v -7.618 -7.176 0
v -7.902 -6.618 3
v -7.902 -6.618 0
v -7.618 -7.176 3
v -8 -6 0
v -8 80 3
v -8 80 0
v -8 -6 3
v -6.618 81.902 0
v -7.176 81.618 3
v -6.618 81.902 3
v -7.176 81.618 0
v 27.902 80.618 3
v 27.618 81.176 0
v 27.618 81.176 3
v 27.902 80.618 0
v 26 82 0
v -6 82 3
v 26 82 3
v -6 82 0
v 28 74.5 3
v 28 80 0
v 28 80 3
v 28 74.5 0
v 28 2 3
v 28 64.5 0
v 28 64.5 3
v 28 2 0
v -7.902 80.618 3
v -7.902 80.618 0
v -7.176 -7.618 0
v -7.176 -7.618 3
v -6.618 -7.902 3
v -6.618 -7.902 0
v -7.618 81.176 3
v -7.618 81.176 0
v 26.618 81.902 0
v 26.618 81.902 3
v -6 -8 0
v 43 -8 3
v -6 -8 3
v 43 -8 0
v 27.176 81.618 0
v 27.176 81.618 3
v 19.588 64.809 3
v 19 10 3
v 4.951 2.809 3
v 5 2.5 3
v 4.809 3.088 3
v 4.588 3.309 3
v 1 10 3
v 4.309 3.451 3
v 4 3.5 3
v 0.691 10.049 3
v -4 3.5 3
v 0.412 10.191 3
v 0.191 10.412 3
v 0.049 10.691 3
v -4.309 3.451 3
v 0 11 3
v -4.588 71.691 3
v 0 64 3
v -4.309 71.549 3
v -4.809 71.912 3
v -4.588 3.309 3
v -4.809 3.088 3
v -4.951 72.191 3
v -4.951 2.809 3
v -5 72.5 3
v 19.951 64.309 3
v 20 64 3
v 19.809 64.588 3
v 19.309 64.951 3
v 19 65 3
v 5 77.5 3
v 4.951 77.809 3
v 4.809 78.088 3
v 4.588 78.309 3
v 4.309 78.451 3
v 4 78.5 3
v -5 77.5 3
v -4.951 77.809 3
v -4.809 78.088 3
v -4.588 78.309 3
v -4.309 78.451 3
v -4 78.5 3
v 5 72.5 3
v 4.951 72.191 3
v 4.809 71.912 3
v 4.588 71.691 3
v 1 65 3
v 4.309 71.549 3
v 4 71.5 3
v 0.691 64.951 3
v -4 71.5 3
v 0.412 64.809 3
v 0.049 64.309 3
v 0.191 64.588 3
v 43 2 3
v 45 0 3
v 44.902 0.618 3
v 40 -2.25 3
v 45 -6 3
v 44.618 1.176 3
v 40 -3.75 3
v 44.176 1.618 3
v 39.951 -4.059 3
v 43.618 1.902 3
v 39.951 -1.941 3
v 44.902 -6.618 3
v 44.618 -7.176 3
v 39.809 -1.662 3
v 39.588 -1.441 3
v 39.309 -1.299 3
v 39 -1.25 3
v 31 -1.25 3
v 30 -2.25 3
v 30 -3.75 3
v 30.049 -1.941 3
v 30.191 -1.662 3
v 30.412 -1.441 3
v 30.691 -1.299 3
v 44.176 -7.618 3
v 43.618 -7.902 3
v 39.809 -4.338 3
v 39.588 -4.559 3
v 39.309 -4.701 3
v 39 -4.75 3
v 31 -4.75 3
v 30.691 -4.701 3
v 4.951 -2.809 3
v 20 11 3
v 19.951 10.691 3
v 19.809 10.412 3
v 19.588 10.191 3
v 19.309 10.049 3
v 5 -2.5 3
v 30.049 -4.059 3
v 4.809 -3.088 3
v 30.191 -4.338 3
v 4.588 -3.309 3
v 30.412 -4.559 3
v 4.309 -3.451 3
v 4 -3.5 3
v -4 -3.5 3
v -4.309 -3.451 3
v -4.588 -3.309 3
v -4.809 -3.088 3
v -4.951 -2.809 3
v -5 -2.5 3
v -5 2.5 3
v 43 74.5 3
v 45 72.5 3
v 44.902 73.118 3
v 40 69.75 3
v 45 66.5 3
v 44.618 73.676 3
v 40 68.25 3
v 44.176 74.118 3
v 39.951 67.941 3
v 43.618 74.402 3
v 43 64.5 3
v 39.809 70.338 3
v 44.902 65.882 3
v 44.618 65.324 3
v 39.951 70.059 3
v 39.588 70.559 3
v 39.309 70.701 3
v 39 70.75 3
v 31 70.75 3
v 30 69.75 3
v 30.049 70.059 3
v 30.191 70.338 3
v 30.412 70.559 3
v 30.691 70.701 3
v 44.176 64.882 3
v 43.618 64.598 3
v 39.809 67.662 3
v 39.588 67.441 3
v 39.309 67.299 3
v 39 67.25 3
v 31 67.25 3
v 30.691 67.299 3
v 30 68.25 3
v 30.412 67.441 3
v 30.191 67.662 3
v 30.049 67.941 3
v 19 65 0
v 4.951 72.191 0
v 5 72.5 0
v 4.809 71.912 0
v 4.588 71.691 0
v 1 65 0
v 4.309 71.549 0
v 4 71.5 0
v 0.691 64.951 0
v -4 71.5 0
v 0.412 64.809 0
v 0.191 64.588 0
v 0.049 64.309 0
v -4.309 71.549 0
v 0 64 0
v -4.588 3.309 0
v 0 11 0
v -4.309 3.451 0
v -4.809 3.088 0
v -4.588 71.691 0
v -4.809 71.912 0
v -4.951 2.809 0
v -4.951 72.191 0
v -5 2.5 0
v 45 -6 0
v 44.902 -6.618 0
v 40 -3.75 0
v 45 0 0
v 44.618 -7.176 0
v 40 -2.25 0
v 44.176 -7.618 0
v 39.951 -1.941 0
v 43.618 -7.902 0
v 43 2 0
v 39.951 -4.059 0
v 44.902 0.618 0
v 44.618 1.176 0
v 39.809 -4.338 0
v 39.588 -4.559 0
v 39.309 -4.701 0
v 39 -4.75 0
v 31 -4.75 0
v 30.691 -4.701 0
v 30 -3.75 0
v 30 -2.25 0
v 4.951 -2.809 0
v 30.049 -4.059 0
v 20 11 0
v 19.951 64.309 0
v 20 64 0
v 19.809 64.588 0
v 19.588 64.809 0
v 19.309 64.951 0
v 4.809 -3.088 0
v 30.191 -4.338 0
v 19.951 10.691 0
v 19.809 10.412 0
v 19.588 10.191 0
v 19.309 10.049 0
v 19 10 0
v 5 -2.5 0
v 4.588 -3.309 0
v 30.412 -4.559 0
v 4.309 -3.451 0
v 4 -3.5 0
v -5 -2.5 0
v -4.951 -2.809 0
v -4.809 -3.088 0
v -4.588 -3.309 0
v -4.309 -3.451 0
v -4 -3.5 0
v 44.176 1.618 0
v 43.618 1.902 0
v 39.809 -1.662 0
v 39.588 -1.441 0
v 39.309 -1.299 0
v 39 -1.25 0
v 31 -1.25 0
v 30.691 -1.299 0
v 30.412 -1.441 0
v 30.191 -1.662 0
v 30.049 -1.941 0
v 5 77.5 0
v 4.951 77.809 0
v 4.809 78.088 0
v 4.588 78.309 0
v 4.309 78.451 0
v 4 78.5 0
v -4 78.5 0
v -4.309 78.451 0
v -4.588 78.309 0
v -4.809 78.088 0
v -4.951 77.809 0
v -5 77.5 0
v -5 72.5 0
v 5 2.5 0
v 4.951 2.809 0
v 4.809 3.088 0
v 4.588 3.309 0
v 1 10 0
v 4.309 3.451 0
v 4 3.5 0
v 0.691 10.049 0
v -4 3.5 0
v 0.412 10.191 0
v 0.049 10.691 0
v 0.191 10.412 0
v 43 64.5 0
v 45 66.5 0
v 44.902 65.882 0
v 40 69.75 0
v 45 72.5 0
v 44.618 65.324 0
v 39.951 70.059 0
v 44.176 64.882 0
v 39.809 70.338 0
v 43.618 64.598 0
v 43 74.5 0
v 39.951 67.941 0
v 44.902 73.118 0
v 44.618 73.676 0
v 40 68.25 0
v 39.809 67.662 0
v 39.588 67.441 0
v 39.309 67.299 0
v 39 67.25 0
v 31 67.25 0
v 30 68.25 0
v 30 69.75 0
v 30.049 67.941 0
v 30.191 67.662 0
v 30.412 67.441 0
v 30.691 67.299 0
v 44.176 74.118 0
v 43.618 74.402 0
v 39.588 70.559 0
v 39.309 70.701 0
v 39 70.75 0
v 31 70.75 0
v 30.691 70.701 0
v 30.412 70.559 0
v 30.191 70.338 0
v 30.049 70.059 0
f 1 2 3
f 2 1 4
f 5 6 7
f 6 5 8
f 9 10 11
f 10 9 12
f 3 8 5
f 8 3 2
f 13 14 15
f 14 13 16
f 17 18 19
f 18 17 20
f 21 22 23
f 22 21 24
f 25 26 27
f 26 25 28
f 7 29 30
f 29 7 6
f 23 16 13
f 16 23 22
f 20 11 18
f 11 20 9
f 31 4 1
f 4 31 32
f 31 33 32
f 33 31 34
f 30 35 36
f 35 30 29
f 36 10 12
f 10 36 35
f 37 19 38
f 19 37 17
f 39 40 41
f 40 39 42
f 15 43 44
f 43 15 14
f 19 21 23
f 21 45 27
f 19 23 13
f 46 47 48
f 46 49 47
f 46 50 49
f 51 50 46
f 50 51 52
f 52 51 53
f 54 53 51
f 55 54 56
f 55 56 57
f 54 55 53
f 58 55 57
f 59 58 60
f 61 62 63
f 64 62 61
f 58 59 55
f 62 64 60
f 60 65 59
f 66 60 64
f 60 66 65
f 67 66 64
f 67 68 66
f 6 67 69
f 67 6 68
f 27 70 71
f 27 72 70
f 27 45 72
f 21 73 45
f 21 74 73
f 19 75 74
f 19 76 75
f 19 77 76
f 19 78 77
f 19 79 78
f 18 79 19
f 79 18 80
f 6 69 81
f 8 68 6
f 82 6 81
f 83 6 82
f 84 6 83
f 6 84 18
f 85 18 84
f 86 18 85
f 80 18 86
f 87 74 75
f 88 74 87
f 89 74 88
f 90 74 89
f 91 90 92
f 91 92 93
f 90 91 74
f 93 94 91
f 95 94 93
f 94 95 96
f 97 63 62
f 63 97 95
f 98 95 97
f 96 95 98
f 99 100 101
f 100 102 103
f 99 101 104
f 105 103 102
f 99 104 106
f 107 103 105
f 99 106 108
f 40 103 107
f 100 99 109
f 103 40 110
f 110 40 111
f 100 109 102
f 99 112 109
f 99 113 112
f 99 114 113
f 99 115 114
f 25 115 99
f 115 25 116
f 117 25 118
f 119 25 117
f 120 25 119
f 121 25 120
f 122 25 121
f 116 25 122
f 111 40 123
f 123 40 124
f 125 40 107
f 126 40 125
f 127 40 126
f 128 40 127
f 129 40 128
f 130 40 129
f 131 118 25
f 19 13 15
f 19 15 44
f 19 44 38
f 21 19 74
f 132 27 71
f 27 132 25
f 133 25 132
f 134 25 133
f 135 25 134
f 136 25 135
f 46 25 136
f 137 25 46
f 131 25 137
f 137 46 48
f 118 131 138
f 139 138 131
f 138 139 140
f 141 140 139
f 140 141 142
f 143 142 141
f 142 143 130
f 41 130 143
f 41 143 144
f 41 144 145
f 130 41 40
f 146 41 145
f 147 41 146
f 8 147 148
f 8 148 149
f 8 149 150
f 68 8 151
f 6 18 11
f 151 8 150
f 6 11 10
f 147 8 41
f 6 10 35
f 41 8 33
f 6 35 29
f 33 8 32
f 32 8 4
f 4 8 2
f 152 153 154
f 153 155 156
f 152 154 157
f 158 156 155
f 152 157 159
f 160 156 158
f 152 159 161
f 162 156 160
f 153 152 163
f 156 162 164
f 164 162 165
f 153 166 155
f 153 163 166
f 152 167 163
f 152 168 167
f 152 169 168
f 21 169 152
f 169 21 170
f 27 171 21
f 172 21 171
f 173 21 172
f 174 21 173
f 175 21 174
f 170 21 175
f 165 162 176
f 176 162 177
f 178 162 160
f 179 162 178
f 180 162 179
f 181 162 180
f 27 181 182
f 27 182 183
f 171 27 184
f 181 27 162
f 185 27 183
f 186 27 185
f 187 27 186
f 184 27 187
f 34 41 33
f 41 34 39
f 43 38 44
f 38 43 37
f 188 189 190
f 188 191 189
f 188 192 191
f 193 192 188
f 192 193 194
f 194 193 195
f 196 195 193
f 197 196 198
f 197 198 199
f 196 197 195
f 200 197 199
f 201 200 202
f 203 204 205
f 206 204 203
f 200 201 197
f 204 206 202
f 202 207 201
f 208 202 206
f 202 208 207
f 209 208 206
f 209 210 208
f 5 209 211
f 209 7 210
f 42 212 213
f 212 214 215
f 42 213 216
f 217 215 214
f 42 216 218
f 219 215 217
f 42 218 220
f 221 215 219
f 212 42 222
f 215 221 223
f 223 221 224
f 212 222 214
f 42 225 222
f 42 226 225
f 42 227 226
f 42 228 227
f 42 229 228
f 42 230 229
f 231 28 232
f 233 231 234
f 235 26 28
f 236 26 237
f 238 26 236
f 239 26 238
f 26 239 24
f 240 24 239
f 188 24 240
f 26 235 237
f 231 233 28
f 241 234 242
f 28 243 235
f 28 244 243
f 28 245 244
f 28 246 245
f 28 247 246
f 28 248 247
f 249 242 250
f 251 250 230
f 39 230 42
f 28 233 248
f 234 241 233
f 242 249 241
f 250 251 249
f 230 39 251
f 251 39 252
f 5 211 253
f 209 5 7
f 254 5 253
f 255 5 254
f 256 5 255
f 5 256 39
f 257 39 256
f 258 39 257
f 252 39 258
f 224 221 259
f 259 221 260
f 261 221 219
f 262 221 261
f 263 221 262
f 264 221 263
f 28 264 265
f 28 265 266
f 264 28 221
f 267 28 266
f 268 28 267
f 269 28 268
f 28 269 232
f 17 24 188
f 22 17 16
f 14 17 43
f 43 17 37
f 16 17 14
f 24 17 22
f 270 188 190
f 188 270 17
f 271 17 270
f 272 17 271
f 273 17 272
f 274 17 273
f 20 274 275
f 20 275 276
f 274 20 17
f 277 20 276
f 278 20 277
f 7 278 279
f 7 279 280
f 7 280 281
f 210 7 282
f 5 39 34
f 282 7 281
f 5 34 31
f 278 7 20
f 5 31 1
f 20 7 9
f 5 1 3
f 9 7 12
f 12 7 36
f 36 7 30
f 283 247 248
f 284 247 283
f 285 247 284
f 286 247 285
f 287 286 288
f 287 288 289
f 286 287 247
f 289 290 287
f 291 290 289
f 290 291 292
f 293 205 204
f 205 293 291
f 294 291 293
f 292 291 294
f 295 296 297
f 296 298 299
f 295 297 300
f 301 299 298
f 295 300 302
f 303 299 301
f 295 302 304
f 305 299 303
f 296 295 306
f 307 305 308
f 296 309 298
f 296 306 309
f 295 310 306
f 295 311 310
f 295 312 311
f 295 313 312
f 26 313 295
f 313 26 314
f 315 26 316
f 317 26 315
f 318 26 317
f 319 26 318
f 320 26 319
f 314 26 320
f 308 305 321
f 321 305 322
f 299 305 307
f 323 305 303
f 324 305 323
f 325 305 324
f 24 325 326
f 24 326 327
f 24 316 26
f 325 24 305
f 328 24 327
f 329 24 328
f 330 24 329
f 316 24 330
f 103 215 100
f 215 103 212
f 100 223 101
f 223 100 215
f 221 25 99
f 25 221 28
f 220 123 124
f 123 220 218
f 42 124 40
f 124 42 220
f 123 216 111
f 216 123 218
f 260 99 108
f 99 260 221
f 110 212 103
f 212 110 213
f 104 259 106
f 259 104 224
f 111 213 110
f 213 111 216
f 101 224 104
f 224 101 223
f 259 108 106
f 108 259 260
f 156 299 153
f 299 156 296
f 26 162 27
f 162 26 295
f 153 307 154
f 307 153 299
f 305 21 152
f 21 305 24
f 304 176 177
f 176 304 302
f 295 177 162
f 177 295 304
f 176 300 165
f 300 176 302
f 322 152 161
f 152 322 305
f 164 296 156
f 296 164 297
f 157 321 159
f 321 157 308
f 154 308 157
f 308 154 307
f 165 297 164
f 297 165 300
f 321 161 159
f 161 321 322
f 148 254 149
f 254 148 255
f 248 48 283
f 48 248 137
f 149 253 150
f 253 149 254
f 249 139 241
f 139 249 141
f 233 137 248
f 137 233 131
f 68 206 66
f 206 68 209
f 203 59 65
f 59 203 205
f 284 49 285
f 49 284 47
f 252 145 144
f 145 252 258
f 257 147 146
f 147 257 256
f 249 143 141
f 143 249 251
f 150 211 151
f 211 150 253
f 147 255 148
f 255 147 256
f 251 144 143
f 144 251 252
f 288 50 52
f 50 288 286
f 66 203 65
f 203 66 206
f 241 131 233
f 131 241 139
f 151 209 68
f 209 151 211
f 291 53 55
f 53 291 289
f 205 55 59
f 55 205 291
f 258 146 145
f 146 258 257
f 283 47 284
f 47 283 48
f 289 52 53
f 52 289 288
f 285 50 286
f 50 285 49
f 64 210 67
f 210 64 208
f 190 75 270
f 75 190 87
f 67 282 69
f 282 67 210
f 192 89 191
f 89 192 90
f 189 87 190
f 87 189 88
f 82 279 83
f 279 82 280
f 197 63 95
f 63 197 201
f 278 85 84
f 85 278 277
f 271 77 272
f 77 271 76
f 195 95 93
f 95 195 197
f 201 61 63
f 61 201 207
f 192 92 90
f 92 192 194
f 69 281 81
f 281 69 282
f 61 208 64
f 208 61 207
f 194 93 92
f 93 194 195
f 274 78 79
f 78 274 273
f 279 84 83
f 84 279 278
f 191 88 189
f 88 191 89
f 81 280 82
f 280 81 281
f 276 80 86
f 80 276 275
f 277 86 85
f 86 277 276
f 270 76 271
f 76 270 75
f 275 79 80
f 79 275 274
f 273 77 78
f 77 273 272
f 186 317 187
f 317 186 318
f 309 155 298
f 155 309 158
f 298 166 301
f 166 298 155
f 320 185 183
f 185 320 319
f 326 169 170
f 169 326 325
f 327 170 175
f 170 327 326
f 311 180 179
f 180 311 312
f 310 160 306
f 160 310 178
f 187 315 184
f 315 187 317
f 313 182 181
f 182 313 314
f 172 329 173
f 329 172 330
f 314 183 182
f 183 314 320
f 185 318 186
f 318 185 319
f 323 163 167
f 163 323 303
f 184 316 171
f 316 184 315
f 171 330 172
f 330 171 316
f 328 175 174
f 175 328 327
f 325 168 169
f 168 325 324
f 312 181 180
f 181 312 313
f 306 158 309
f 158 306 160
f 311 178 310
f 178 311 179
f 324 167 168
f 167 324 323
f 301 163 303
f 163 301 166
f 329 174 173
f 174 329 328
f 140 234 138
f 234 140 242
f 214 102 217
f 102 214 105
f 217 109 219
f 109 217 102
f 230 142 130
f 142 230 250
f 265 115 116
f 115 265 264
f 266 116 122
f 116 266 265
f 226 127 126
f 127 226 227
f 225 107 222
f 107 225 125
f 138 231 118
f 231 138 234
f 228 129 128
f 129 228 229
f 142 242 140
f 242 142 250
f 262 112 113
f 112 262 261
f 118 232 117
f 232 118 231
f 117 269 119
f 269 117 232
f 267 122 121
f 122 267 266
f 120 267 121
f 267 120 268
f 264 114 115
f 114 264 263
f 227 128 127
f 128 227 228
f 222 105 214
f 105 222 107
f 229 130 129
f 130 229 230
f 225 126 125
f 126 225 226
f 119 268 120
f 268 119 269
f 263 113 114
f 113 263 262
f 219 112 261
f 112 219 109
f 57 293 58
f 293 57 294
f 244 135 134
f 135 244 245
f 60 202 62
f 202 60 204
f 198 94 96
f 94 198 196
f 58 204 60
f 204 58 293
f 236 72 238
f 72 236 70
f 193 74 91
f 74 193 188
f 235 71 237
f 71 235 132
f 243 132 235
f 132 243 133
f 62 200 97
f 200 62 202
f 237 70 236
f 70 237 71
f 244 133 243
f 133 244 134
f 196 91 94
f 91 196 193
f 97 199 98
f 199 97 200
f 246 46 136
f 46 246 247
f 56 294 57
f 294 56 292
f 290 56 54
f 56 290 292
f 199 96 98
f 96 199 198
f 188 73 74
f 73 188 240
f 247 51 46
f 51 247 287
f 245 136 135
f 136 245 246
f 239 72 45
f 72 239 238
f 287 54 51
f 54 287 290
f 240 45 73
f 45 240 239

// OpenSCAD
module round_cube(size, radius) {
    x = size[0];
	y = size[1];
	z = size[2];
    
    linear_extrude(height=z)
	hull()
	{
		// place 4 circles in the corners, with the given radius
		translate([0+radius ,0+radius, 0])
		circle(r=radius);
	
		translate([0+radius, y-radius, 0])
		circle(r=radius);
	
		translate([x-radius, y-radius, 0])
		circle(r=radius);
	
		translate([x-radius, 0+radius, 0])
		circle(r=radius);
	}
    
}


module nuts() {
    translate([0,0,0]) cylinder(r=3, h=10);
    translate([0,75,0]) cylinder(r=3, h=10);
    
    translate([35,-3,0]) cylinder(r=1.5, h=20);
    translate([35,72-3,0]) cylinder(r=1.5, h=20);
}


module support() {
    difference() {

        union() {
            translate([-8,-8,0]) round_cube([36,75+15, 3], 2);
            translate([0,-8,0]) round_cube([45, 10, 3], 2);
            translate([0,64.5,0]) round_cube([45, 10, 3], 2);

        }
        // 3 D
        translate([-5,-3.5,-1]) round_cube([10, 7, 10], 1);
        translate([-5,71.5,-1]) round_cube([10, 7, 10], 1);
  
        // 1.5 D
        translate([30, 67.25,-1]) round_cube([10, 3.5, 10], 1);
        translate([30, -4.75,-1]) round_cube([10, 3.5, 10], 1);

        // optimize
        translate([0, 10, -1]) round_cube([20, 55, 10], 1);
        
     }
}

$fn=20;
//nuts();
support();
